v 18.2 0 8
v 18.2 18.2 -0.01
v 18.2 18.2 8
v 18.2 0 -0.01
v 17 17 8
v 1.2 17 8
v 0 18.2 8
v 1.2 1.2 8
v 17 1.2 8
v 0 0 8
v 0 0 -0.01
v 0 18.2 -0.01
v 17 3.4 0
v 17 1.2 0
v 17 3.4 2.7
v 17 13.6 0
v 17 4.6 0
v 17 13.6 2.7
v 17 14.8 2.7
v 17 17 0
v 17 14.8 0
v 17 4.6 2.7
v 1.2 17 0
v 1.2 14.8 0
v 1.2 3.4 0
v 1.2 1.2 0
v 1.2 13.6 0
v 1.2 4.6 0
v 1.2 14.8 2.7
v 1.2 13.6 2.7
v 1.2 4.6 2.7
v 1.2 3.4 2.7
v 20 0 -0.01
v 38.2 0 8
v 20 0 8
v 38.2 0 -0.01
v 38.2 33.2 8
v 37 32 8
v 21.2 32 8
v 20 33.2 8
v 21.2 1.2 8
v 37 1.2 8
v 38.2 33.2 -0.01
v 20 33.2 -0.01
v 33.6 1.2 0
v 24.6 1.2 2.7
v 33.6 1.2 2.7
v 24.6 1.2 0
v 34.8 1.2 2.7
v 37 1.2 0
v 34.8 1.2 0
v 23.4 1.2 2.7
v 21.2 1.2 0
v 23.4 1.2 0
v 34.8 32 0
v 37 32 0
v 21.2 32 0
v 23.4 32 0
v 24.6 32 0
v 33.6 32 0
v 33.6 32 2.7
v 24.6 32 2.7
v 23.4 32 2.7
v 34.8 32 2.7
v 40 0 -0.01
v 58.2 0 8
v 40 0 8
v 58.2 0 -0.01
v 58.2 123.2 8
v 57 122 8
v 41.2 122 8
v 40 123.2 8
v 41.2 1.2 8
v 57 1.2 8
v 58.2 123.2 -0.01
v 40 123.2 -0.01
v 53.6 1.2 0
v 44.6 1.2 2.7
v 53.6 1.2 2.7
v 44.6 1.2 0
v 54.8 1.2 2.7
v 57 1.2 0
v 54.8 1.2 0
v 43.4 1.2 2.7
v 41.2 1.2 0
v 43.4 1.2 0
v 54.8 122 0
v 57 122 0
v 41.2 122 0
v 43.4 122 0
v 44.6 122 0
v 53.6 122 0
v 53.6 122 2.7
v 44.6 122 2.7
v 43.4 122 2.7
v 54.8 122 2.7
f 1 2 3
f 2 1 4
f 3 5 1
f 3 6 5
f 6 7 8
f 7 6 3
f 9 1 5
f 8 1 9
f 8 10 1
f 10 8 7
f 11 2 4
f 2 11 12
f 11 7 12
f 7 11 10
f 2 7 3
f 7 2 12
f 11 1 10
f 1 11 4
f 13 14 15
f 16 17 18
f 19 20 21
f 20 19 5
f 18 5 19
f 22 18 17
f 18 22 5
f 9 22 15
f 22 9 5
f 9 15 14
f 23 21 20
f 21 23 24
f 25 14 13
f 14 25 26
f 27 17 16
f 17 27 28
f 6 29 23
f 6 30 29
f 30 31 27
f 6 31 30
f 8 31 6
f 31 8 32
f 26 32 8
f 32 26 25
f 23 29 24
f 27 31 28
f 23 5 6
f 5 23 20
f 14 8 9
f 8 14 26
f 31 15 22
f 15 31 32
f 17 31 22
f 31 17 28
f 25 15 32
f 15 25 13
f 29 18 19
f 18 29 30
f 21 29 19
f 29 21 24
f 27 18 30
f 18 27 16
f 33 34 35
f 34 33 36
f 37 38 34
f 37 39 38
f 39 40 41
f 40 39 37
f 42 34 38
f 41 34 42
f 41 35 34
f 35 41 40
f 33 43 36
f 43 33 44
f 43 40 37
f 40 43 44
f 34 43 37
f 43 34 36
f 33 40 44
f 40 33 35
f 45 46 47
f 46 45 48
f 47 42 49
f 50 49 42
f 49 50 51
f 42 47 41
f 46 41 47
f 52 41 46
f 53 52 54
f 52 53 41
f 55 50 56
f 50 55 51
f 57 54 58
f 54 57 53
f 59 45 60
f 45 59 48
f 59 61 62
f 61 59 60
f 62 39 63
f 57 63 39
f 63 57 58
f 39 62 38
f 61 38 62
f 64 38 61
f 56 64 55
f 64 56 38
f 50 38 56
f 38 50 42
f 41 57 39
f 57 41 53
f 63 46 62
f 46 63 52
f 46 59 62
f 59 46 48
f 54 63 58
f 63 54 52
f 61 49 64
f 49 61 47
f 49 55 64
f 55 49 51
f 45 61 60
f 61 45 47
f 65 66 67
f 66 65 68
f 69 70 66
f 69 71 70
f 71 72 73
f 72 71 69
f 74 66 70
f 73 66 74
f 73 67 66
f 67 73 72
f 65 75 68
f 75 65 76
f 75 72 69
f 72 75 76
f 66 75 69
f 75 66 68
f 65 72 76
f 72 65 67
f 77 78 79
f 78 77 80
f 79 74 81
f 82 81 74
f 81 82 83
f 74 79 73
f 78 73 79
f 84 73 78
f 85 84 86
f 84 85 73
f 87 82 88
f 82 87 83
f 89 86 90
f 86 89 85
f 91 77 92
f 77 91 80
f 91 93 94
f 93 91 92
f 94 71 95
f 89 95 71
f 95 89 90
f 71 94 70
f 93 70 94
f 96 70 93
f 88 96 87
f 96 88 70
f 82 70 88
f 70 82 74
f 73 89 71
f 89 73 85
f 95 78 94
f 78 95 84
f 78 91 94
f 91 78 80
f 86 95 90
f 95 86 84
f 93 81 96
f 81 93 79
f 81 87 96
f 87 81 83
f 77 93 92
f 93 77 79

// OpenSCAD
// file: ../../Base/Boxes.scad
// Fischertechnik Box Foundation
// Pre-designed Boxes

use <Constants.scad>

include <PlacementOptions.scad>

box190Width = 190;
box190Depth = 130;
box130Width = 130;
box130Depth = 95;
boxUsageHeight = 33.9;
boxWallThickness = 2.4;
boxBaseThickness = 1.0;

// getBoxWallThickness()
// Gets the wall thickness of a Fischertechnik Box

function getBoxWallThickness() = boxWallThickness;

// Gets the usable height of a fischertechnik box
function getBoxUsageHeight() = boxUsageHeight;

// Gets the thickness of the Fischertechnik box base.
function getBoxBaseThickness() = boxBaseThickness;

// Gets the usable inner space of a Box 190 as an x/y-list
function getBox190Space() = [
    box190Width - 2*getBoxWallThickness(), 
    box190Depth - 2*getBoxWallThickness() ];

// Imports the Fischertechnik empty box 130x190 mm and places it at position 0,0
// 190x130 are the outer sizes, the inner space is slightly smaller. Use getBox190Space() to get the inner sizes.
// This module needs the STL file "Fischertechnik Box 130x190.stl" in the library path.
// The box is positioned that the usable inner space is at the 0,0,0 position. The

module Box190() {
    translate([-getBoxWallThickness(),-getBoxWallThickness(),-getBoxBaseThickness()])
        import("Fischertechnik Box 130x190.stl", convexity=3);
}

// Gets the usable inner space of a Box 130 as an x/y-list
function getBox130Space() = [
    box130Width - 2*getBoxWallThickness(), 
    box130Depth - 2*getBoxWallThickness() ];

// Imports the Fischertechnik empty box 95x130 mm and places it at position 0,0
// 190x130 are the outer sizes, the inner space is slightly smaller. Use getBox190Space() to get the inner sizes.
// This module needs the STL file "Fischertechnik Box 95x130.stl" in the library path.
// The box is positioned that the usable inner space is at the 0,0,0 position. The

module Box130() {
    translate([-getBoxWallThickness(),-getBoxWallThickness(),-getBoxBaseThickness()])
        import("Fischertechnik Box 95x130.stl", convexity=3);
}

// Creates a web at the specified box walls
// corner 0 = LowerLeft, 1 = UpperLeft, 2 = UpperRight, 3 = LowerRight
// side 0 = LeftOfCorner, 1 = RightOfCorner
// distance = Distance in mm from the corner
// box = inner width and depth of the box (default: Box 190)
// webWidth = length of the web (default is 3 mms)
// webThickness = thickness of the web (default is 1 mm)

module BoxWeb(corner, side, distance, box=getBox190Space(), webWidth=3, webThickness=1.0) {
    sink = getBoxWallThickness()/2;

    width = (corner % 2 == 0) ? 
            (side == LeftOfCorner ? webWidth : webThickness) :
            (side == LeftOfCorner ? webThickness : webWidth);

    depth = (corner % 2 == 0) ? 
            (side == RightOfCorner ? webWidth : webThickness) :
            (side == RightOfCorner ? webThickness : webWidth);
    
    xDiff = corner == LowerLeft ? 
                (side == LeftOfCorner ? -sink : distance) :
            (corner == UpperLeft ?                
                (side == LeftOfCorner ? distance : -sink) :
            (corner == UpperRight ?
                (side == LeftOfCorner ? box.x-webWidth+sink : box.x-distance-webThickness) :
                (side == LeftOfCorner ? box.x-distance-webThickness: box.x-webWidth+sink)));

    yDiff = corner == LowerLeft ? 
                (side == RightOfCorner ? -sink : distance) :
            (corner == UpperLeft ?
                (side == RightOfCorner ? box.y-distance : box.y-webWidth+sink) :
            (corner == UpperRight ?
                (side == RightOfCorner ? box.y-webWidth+sink : box.y-distance) :
                (side == RightOfCorner ? distance : -sink)));
    
    translate([xDiff, yDiff, -getExcess()])
        cube([width, depth, boxUsageHeight + 2*getExcess()]);
}
// file: ../../Base/Rotation.scad
// Fischertechnik Box Foundation
// Geometry Helpers Rotation

include <PlacementOptions.scad>

// getRotatedSpace(space, rotation=NoRotation)
// Rotates the space dependent on the specified rotation

function getRotatedSpace(space, rotation=NoRotation) = [
    (rotation == Rotate90 || rotation == Rotate270) ? space.y : space.x,
    (rotation == Rotate90 || rotation == Rotate270) ? space.x : space.y
];

// Rotates the given space around the fixed left lower corner
// space = the space the children needs as width/depth list [width,depth]
// rotation = 0 Rotate0 degrees, 1 Rotate90 degrees, 2 Rotate180 degrees, 3 Rotate270 degrees (equivalent to -90)

module RotateFix(space, rotation=Rotate0) {
    dy = (rotation == Rotate0 || rotation == Rotate270) ? 0 :
        (rotation == Rotate90) ? space.x :
        space.y;
    dx = (rotation < Rotate180) ? 0 :
        (rotation == Rotate180) ? space.x :
        space.y;
    
    translate([dx, dy, 0])
        rotate([0, 0, rotations[rotation]])
            children();
}
// file: ../../Base/Alignment.scad
// Fischertechnik Box Foundation
// Geometry Helpers Alignment

include <PlacementOptions.scad>

// getAlignedX(elementWidth, spaceWidth, align=AlignRight, offset=0)
// Gets the aligned X offset of an element with the given
// width in the given space.
// elementWidth = The width of the element to positon
// spaceWidth = The space where the element should be aligned
// align = 0 AlignLeft, 1 AlignCenter, 2 AlignRight
// offset = an optional offset from the aligned position. When
// aligned left or centered, then positive values are in X direction.
// When aligned right then positive values are in negative X direction.

function getAlignedX(elementWidth, spaceWidth, align=AlignRight, offset=0) =
    (align == AlignLeft) ?
        offset :
        ((align == AlignCenter) ?
        (spaceWidth - elementWidth)/2 + offset :
        spaceWidth - offset - elementWidth);

// getAlignedY(elementDepth, spaceDepth, align=AlignTop, offset=0)
// Gets the aligned Y offset of an element with the given
// depth in the given space.
// elementDepth = The depth of the element to positon
// spaceDepth = The space where the element should be aligned
// align = 0 AlignBottom, 1 AlignCenter, 2 AlignTop
// offset = an optional offset from the aligned position. When
// aligned bottom or centered, then positive values are in Y direction.
// When aligned top then positive values are in negative Y direction.

function getAlignedY(elementDepth, spaceDepth, align=AlignTop, offset=0) =
    (align == AlignBottom) ?
        offset :
        ((align == AlignCenter) ?
        (spaceDepth - elementDepth)/2 + offset :
        spaceDepth - offset - elementDepth);
// file: ../../Base/Constants.scad
// Fischertechnik Box Foundation
// Constants

// Constant values necessary for multiple elements

// Base constants
dividerThickness = 1.2;
excess = 0.01;
fragments = 90;
tolerance = 0.8;

// Gets the thickness of a divider 
function getDividerThickness() = dividerThickness;

// Gets the excess that is used to merge walls into each other
function getExcess() = excess;

// Gets amount of fragments of a cylinder
function getFragments() = fragments;

// Gets the inner tolerance of a frame to each side
function getTolerance() = tolerance;


// Fischertechnik specific constants
axisDiameter = 4;
axisBottomDiameter = axisDiameter + 1;
standardEdgeDistance = 2.5;
standardWebDistance = 11.5;
standardCornerLength = 15;
tubeWallFactor = 1.6;

// Gets axis diameter
function getAxisDiameter() = axisDiameter;

// Gets axis bottom diameter for thicker part at the bottom
function getAxisBottomDiameter() = axisBottomDiameter;

// gets the standard distance to the wall of the box for dockable frames with webs
function getStandardEdgeDistance() = standardEdgeDistance;

// gets the standard distance of each web to the corner of the dockable frame
function getStandardWebDistance() = standardWebDistance;

// gets the standard length of the corner walls of a dockable frame
function getStandardCornerLength() = standardCornerLength;

// gets the wall thickness of a tube.
function getTubeWallThickness() = tubeWallFactor * getDividerThickness();
// file: ../../Base/PlacementOptions.scad
// Fischertechnik Box Foundation
// Placement Options

// Alignment
NoAlign = 0;
AlignLeft = 1;
AlignBottom = 2;
AlignCenter = 3;
AlignRight = 4;
AlignTop = 5;

// Element rotation degree steps
rotations = [0, -90, -180, -270];

// Rotation
NoRotation = 0;
Rotate0 = 0;
Rotate90 = 1;
Rotate180 = 2;
Rotate270 = 3;

// Docking (seen from above)
NoDock = -1;
DockLeft = 0;
DockTop = 1;
DockRight = 2;
DockCorner = 2;
DockBottom = 3;

// Web corners
LowerLeft = 0;
UpperLeft = 1;
UpperRight = 2;
LowerRight = 3;

// Web position relative to corner
LeftOfCorner = 0;
RightOfCorner = 1;
// file: ../../Elements/FrameBlockWithPin.scad
// Fischertechnik Box Library
// Frame for Building Blocks with Connector
// 38240, 37636

use <../Base/Constants.scad>
use <../ModelBase/Simple.scad>

width = 15;
depth = 15;
height = 8;

// getFrameBlockWithPinSpace()
// Gets the space the frame block with pin needs as width (.x and .y as a list)
// for the specified count of blocks

function getFrameBlockWithPinSpace(count = 1) = getFrameOuterVolume([width * count, depth, height]);

// FrameBlockWithPin(count, height=8)
// Frame for count standing building blocks with pin down
// count = Count of blocks
// height = Height of the frame (default is 8)

module FrameBlockWithPin(count = 1, height=height) {
    railWidth = getFrameBlockWithPinSpace(count).x;
    railHeight = 2.7;
    railDistance = 9;
    
    module Rails() {
        Wall([railWidth, getDividerThickness(), railHeight]);
        translate([0, railDistance + getDividerThickness()])
            Wall([railWidth, getDividerThickness(), railHeight]);
    }

    Frame([width*count, depth, height]);

    railsDepth = railDistance + 2*getDividerThickness();

    translate([0, (getFrameBlockWithPinSpace(count).y - railsDepth) / 2]) 
        Rails();
}

// Test
count = 2;
color("lightgray") {
FrameBlockWithPin(count);
}
// file: ../../Base/Placement.scad
// Fischertechnik Box Foundation
// Geometry Helpers Placement

use <Constants.scad>
use <Alignment.scad>
use <Rotation.scad>
use <Boxes.scad>

include <PlacementOptions.scad>

// Place(x=0, y=0, elementSpace=[0,0], alignX=AlignLeft, alignY=AlignBottom, rotation=Rotate0, boxSpace=getBox190Space())
// Places the child at the specified position
// y = Y-Position. This is a relative position when an X aligment is specified.
// x = X-Position. This is a relative position when an Y aligment is specified.
// elementSpace = space of the element to be placed [x,y]
// alignX = -1=NoAlign, 0 AlignLeft, 1 AlignCenter, 3 AlignRight (elementSpace and boxSpace required!)
// alignY = -1=NoAlign, 2 AlignBottom, 1 AlignCenter, 4 AlignTop (elementSpace and boxSpace required!)
// rotation = 0 Rotate0 0 degrees, 1 Rotate90 90 degrees, 
// 2 Rotate180 180 degrees, 3 Rotate270 270 degrees (equivalent to -90)
// boxSpace = Inner space of the box where the placement occurs [x,y] - default is Box 190x130 inner space

module Place(x=0, y=0, elementSpace=[0,0], 
  alignX=AlignLeft, alignY=AlignBottom, 
  rotation=NoRotation, boxSpace=getBox190Space()) {

    module Position(x, y, space, rotation=Rotate0) {
        translate([x, y, 0])
            RotateFix(space, rotation)
                children(0);
    }

    space = getRotatedSpace(elementSpace, rotation);
    alignedX = getAlignedX(space.x, boxSpace.x, alignX, x);
    alignedY = getAlignedY(space.y, boxSpace.y, alignY, y);
    Position(alignedX, alignedY, elementSpace, rotation)
        children(0);
}

// Center(space=getBox130Space(), elementSpace=[0,0])
// space = Space where the children is centered. For cylinder use centered=true and no elementSpace.
// elementSpace = space of the element to be centered [x,y]

module Center(space=getBox190Space(), elementSpace=[0,0]) {
    translate([(space.x - elementSpace.x) / 2, (space.y - elementSpace.y) / 2])
        children(0);
}

// CenterHorizontal(width=0, y=0, offset=0, space=getBox130Space())
// space = Space where the children is centered. For cylinder use centered=true and no elementSpace.
// elementSpace = space of the element to be centered [x,y]

module CenterHorizontal(width=0, y=0, offset=0, space=getBox190Space()) {
    translate([(space.x - width) / 2 + offset, y])
        children(0);
}

// CenterVertical(depth=0, x=0, offset=0, space=getBox130Space())
// space = Space where the children is centered. For cylinder use centered=true and no elementSpace.
// elementSpace = space of the element to be centered [x,y]

module CenterVerticalal(depth=0, x=0, offset=0, space=getBox190Space()) {
    translate([x, (space.y - depth) / 2 + offset])
        children(0);
}
// main file
// Fischertechnik Box Foundation
// Elements
// Test FrameBlockWithPin

use <../../Base/Placement.scad>
use <../../Elements/FrameBlockWithPin.scad>

include <../../Base/PlacementOptions.scad>

FrameBlockWithPin();

Place(20, 0, elementSpace=getFrameBlockWithPinSpace(2), rotation=Rotate90)
    FrameBlockWithPin(2);

Place(40, 0, elementSpace=getFrameBlockWithPinSpace(8), rotation=Rotate90)
    FrameBlockWithPin(8);
